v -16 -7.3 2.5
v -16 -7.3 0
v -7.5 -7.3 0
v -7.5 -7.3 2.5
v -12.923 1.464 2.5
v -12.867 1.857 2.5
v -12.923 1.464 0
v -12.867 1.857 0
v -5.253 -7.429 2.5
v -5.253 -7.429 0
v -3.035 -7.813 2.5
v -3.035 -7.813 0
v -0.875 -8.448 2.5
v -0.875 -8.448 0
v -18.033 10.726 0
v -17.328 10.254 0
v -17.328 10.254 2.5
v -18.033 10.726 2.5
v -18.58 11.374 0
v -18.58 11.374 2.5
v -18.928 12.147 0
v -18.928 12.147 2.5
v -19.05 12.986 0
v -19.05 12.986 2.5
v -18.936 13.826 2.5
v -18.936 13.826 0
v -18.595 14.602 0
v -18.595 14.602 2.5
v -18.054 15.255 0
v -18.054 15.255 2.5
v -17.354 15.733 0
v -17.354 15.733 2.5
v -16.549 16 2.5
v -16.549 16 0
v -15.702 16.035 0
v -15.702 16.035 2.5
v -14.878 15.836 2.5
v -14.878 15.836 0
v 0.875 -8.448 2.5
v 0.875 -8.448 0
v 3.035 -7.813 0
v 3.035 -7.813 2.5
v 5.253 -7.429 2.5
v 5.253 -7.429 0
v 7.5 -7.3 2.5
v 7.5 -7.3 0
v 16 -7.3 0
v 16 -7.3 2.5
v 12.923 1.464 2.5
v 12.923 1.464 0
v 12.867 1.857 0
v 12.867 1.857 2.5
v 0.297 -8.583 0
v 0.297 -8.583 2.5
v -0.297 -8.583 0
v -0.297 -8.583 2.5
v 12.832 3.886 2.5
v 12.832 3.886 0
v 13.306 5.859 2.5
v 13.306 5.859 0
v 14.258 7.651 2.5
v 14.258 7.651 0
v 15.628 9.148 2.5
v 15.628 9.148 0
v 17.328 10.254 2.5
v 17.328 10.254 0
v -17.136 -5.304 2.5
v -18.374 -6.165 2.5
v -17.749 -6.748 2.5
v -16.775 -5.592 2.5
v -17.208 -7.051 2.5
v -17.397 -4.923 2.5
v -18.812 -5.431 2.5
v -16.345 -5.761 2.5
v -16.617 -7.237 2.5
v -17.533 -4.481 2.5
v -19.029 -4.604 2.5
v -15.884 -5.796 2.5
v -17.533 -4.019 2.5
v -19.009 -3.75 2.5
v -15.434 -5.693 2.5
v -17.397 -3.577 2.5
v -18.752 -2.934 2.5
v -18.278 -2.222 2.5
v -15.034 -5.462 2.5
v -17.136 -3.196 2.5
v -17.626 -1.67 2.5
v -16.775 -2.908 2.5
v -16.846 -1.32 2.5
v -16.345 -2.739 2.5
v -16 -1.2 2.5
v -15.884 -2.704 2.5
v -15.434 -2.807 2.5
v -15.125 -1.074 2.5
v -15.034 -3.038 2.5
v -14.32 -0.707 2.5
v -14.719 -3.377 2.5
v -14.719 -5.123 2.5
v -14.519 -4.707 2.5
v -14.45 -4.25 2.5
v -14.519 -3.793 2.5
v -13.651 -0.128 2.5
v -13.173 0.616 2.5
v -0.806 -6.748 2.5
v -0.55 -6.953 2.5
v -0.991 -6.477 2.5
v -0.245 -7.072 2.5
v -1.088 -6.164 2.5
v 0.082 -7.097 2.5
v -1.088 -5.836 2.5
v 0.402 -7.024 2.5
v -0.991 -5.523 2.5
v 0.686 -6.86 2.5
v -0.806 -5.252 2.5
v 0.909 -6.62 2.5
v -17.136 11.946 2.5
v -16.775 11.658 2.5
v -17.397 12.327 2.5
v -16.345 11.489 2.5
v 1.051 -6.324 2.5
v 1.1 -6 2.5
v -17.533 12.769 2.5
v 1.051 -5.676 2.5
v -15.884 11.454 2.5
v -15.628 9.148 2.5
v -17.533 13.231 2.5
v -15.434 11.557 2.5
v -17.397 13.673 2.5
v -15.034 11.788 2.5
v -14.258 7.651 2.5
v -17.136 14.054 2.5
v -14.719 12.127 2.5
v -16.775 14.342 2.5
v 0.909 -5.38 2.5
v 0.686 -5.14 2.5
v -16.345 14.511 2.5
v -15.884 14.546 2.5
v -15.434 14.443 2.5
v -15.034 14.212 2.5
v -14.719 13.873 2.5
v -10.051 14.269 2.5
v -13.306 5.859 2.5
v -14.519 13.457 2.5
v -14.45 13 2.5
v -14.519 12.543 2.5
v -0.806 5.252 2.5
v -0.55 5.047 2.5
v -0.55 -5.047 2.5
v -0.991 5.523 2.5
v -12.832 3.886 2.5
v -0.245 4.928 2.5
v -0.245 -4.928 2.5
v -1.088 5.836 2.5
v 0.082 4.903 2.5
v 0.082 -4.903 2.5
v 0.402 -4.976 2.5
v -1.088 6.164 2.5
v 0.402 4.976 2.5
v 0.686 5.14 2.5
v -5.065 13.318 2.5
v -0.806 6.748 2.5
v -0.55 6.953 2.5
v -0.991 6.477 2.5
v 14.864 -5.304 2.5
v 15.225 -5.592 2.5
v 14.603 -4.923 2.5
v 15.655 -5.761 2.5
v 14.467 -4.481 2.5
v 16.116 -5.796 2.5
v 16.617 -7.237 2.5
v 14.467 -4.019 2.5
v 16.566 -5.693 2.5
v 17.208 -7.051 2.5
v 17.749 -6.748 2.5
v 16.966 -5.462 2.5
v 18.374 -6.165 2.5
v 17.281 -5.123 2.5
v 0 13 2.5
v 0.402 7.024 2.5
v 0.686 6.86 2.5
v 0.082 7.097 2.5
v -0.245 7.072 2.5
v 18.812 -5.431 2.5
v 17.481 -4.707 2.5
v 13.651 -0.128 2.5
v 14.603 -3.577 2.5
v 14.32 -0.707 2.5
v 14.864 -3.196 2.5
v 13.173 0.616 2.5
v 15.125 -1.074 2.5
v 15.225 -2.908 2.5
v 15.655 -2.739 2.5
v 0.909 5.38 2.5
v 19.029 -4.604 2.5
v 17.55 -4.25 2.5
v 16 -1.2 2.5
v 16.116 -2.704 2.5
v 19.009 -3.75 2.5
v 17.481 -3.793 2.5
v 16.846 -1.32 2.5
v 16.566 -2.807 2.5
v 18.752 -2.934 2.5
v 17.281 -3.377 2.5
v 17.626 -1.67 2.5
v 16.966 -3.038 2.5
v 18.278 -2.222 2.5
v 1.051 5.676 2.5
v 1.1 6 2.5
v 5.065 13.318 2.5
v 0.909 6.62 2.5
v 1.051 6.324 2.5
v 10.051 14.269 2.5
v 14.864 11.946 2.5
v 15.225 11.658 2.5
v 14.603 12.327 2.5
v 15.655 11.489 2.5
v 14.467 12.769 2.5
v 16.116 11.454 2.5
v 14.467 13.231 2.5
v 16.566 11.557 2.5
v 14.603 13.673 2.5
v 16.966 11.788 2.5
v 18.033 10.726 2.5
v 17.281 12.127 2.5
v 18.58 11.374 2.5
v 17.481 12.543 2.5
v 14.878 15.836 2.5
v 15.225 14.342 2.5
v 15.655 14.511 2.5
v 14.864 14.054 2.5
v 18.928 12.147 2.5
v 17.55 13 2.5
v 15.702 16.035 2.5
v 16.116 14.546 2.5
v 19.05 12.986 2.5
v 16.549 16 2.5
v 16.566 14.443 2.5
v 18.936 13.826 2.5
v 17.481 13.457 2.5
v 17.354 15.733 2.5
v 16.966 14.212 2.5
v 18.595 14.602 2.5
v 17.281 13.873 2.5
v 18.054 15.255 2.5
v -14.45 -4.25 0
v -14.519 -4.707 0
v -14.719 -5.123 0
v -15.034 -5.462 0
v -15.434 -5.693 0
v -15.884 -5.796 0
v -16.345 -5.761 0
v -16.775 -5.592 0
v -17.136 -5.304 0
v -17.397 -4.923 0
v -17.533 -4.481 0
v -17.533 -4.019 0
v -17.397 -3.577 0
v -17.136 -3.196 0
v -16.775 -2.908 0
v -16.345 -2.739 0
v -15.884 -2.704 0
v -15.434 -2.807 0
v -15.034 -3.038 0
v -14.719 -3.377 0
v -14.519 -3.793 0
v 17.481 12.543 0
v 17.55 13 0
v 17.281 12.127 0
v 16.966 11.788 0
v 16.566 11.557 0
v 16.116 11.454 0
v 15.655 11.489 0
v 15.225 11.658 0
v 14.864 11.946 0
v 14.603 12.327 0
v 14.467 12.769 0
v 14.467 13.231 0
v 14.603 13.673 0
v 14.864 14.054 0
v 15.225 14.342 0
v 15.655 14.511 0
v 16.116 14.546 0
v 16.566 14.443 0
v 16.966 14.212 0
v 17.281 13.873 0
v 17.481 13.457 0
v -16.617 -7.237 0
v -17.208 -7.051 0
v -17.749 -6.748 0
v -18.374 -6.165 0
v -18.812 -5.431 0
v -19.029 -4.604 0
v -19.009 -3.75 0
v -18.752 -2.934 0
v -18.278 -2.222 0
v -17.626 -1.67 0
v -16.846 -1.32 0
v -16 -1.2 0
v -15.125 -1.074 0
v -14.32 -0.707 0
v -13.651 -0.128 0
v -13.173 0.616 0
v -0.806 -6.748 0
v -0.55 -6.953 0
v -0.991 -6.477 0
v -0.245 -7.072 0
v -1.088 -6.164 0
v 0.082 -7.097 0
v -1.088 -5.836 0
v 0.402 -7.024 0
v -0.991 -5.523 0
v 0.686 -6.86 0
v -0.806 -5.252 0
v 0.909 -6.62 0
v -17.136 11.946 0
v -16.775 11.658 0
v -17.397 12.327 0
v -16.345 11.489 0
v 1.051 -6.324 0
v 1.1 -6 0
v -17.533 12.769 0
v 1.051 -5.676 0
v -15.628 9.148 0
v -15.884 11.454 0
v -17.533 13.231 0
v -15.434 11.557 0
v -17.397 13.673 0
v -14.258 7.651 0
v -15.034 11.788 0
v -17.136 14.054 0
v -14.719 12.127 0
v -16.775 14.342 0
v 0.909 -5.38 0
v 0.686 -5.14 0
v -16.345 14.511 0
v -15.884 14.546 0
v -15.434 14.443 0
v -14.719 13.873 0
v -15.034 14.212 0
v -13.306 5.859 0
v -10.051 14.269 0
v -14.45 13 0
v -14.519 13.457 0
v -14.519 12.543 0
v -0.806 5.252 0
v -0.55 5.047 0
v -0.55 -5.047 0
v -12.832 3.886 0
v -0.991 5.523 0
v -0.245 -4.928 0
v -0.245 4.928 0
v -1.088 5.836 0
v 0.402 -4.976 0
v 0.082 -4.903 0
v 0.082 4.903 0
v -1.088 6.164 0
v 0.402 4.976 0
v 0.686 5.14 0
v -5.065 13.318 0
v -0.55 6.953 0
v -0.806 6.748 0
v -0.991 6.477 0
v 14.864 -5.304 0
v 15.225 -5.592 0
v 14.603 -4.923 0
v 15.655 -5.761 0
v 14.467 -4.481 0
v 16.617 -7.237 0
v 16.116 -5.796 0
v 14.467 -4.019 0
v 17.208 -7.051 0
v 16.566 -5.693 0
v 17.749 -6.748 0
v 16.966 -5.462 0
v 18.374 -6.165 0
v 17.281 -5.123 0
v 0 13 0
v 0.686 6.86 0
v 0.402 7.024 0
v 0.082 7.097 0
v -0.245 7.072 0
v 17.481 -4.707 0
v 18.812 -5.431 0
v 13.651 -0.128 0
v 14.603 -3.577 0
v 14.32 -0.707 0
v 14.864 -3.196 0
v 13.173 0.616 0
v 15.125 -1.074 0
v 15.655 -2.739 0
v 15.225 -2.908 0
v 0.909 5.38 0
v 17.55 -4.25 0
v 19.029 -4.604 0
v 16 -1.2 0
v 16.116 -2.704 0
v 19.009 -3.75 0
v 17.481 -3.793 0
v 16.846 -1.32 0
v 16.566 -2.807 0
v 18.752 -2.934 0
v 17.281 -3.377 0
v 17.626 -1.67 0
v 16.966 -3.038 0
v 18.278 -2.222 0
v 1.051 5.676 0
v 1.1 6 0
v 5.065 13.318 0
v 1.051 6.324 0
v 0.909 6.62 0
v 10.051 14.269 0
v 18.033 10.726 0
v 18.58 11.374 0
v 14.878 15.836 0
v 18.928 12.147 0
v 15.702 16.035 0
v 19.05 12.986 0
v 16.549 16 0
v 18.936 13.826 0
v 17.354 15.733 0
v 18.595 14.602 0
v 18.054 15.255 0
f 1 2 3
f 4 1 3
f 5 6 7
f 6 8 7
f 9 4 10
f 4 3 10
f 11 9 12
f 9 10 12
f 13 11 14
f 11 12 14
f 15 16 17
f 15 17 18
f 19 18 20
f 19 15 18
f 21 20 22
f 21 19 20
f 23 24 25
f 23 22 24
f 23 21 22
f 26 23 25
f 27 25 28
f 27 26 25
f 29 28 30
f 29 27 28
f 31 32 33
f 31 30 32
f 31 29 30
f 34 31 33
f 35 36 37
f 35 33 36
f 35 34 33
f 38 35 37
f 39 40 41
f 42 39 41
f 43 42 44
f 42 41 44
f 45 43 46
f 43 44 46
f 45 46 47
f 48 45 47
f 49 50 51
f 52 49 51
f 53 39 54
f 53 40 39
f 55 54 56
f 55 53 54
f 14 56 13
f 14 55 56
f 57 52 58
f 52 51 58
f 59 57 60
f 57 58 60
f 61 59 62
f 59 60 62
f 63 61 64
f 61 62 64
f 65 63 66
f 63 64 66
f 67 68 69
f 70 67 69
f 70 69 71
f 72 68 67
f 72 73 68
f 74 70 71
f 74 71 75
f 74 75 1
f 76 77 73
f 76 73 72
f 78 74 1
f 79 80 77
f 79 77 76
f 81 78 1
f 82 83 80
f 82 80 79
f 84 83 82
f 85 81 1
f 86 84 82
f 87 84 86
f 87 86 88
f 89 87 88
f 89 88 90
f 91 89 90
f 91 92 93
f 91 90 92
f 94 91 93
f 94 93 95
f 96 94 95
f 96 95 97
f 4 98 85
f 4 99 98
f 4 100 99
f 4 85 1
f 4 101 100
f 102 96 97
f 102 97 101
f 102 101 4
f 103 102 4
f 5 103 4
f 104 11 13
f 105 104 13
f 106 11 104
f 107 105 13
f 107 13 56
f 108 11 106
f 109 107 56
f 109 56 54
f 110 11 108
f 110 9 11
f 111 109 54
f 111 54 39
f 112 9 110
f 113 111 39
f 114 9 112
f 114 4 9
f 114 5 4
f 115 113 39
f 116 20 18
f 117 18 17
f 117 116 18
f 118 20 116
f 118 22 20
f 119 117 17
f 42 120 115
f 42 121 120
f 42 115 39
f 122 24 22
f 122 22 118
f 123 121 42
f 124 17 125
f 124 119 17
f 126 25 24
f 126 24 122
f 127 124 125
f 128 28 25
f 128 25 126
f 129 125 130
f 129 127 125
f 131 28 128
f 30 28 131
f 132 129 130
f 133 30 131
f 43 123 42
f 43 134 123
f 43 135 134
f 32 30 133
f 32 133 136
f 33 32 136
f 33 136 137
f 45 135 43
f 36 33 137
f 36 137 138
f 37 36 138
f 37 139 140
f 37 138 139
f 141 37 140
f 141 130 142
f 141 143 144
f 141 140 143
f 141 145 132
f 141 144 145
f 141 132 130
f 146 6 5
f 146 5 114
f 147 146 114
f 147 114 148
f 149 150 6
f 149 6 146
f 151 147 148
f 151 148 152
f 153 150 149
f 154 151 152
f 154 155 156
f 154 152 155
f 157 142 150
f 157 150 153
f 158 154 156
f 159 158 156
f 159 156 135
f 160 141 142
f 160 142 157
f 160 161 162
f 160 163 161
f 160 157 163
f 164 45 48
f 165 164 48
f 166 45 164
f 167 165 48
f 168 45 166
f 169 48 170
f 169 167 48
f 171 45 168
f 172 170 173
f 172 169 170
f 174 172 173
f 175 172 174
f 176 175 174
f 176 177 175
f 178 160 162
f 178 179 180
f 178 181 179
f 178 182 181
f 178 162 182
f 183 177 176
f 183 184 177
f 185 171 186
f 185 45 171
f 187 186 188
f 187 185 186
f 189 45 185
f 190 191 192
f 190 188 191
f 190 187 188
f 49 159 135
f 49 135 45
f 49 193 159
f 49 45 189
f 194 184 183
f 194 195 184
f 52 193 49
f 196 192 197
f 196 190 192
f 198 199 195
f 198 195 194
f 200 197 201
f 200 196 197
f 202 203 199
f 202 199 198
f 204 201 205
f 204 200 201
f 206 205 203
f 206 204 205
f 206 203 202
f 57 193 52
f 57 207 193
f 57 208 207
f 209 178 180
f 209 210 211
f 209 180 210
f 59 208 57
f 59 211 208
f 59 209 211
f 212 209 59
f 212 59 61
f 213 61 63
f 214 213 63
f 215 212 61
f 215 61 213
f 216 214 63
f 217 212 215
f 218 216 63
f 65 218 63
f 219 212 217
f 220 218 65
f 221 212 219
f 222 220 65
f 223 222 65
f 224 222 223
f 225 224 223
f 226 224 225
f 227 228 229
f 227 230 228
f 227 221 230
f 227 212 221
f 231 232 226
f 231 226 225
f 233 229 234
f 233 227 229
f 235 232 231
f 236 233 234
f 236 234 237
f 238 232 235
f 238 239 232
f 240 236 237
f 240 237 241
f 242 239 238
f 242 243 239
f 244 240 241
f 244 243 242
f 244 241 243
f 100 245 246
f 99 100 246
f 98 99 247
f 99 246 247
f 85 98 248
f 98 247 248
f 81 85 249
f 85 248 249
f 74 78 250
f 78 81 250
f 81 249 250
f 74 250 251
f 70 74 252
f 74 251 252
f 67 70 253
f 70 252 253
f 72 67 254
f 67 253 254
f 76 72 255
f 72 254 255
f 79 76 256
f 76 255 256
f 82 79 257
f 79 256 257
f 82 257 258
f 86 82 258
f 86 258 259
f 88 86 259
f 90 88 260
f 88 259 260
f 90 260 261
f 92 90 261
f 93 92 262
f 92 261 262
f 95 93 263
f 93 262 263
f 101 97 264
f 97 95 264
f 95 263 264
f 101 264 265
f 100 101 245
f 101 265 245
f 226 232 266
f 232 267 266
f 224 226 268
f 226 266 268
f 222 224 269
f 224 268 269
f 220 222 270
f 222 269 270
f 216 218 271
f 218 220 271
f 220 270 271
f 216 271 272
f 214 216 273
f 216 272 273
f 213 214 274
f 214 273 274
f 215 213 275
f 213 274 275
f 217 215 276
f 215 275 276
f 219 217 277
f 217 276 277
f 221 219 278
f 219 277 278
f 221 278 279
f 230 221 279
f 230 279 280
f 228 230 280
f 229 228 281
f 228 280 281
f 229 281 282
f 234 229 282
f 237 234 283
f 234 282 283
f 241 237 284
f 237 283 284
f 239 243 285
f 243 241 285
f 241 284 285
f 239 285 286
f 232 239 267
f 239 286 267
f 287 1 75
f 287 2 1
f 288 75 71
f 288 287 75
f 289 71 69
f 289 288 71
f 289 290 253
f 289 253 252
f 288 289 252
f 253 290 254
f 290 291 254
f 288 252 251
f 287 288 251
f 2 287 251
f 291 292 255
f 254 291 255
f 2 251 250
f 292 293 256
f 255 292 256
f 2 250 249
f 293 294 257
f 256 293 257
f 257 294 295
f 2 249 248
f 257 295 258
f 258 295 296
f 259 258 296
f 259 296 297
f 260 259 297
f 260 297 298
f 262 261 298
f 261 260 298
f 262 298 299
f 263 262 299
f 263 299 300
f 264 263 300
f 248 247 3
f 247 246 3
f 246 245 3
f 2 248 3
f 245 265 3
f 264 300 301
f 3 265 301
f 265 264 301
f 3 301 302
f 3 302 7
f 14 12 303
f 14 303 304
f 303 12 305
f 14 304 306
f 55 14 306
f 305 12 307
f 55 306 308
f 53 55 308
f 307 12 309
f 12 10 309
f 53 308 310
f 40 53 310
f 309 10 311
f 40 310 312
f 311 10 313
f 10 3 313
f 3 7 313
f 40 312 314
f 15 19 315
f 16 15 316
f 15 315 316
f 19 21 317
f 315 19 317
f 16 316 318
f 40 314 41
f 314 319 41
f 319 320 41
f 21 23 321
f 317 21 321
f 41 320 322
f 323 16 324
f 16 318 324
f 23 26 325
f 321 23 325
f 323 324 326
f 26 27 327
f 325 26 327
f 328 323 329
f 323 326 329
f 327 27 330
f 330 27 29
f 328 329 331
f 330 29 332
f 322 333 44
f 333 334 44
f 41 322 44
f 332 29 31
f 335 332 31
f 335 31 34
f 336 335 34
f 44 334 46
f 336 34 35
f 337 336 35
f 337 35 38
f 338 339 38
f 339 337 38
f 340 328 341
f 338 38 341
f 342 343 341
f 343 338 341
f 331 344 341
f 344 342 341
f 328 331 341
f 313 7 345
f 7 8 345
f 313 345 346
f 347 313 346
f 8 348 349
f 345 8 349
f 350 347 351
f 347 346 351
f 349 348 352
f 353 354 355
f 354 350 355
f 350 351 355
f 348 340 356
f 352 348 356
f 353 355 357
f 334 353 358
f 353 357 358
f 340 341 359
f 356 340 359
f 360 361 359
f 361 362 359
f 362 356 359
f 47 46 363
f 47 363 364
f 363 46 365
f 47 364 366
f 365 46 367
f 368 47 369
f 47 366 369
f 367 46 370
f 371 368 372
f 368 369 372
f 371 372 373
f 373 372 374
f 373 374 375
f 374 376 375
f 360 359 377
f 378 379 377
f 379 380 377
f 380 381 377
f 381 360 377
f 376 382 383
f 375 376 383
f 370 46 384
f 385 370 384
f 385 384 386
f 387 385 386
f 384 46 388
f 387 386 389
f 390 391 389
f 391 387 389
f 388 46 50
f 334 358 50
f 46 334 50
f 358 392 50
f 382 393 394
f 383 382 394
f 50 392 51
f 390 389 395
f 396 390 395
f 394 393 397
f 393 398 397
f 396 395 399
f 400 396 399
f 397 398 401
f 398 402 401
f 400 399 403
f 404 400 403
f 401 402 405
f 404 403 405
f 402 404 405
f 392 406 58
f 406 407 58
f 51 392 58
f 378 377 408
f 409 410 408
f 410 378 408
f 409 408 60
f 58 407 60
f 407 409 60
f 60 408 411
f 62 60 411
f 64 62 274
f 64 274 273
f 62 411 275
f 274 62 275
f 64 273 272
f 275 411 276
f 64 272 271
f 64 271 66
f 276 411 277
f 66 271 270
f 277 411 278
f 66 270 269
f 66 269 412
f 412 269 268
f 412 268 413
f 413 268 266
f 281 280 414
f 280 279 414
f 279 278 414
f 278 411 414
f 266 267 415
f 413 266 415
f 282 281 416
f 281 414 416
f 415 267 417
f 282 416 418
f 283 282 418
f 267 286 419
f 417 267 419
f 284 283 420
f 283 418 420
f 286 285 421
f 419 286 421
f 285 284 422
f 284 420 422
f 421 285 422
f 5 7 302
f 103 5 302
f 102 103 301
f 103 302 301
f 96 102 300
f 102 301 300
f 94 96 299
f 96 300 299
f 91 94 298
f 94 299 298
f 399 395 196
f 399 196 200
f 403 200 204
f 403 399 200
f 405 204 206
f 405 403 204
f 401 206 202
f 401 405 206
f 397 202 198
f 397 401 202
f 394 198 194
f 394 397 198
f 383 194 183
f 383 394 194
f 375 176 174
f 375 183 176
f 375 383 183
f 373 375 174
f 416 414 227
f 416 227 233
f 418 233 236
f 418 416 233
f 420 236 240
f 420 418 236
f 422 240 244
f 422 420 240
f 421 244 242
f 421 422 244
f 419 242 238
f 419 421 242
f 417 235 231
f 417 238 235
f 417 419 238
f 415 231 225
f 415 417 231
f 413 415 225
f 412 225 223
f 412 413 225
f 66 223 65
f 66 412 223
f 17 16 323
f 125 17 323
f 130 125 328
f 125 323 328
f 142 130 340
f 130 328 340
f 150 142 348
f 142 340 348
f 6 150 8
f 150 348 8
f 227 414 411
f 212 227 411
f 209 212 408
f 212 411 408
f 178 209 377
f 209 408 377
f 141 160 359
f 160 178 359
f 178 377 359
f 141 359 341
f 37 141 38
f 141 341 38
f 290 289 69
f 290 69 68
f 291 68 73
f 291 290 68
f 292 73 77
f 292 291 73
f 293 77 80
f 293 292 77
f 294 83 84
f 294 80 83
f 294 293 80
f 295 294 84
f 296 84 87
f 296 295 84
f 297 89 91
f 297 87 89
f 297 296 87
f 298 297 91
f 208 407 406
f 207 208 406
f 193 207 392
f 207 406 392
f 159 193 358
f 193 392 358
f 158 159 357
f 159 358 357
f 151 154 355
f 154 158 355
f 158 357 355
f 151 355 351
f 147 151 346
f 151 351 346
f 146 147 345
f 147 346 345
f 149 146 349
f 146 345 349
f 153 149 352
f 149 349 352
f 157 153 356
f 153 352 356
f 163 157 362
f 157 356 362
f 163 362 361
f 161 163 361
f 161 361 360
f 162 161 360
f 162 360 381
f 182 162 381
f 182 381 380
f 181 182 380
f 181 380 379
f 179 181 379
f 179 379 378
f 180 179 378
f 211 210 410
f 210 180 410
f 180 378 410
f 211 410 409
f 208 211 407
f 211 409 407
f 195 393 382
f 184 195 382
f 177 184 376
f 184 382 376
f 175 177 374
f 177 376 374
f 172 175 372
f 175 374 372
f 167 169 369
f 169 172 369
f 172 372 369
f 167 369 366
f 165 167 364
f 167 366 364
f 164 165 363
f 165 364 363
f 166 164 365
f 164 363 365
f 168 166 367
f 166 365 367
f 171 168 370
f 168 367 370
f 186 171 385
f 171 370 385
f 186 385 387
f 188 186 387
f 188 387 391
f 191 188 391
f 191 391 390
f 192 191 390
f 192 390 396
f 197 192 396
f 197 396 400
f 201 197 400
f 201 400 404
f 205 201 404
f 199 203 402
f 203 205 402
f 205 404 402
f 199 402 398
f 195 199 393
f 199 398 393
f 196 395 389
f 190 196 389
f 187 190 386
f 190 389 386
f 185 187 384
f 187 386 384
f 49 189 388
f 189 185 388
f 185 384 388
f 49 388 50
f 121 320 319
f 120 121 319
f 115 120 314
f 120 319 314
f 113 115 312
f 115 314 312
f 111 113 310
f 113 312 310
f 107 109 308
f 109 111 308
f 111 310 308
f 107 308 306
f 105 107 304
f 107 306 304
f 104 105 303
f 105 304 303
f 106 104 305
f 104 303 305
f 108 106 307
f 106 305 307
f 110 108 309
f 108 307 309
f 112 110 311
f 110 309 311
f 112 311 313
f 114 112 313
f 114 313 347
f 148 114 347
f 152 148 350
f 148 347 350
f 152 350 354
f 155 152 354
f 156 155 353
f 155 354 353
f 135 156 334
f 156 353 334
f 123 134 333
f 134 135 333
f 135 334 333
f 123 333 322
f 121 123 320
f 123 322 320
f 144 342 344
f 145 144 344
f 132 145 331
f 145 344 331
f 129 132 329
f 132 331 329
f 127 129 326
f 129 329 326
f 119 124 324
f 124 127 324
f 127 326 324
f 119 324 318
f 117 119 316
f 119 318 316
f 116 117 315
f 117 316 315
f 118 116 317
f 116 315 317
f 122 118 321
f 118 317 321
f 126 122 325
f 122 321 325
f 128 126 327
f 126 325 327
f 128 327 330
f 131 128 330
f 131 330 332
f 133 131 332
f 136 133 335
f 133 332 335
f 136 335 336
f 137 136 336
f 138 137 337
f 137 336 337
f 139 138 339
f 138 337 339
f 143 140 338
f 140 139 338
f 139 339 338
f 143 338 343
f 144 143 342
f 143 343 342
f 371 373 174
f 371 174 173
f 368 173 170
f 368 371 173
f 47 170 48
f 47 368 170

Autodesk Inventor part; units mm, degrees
ref_plane "YZ Plane" through (0, 0, 0) normal (1, 0, 0) x (0, 1, 0)
ref_plane "XZ Plane" through (0, 0, 0) normal (0, 1, 0) x (-1, 0, 0)
ref_plane "XY Plane" through (0, 0, 0) normal (0, 0, 1) x (1, 0, 0)
sketch "Sketch1" plane through (0, 0, 0) normal (0, 0, 1) x (1, 0, 0)
  circle A0 centre (0, -6) radius 1.1 projected
  circle A1 centre (0, 6) radius 1.1 projected
  circle A2 centre (-16, 13) radius 1.55 projected
  circle A3 centre (16, 13) radius 1.55 projected
  circle A4 centre (-16, -4.25) radius 1.55 projected
  circle A5 centre (16, -4.25) radius 1.55 projected
  arc A6 (17.7494, -6.7484) -> (16, -1.2) centre (16, -4.25) ccw projected
  arc A7 (12.9233, 1.4645) -> (16, -1.2) centre (16, 1.9085) ccw projected
  arc A8 (17.3284, 10.2545) -> (12.8667, 1.8571) centre (20.8351, 3.0073) ccw projected
  line L0 (12.9233, 1.4645) -> (12.8667, 1.8571) projected
  arc A9 (17.3284, 10.2545) -> (14.878, 15.8361) centre (16, 13) ccw projected
  arc A10 (-14.878, 15.8361) -> (14.878, 15.8361) centre (0, 53.4422) ccw projected
  arc A11 (-14.878, 15.8361) -> (-17.3284, 10.2545) centre (-16, 13) ccw projected
  arc A12 (-12.8667, 1.8571) -> (-17.3284, 10.2545) centre (-20.8351, 3.0073) ccw projected
  arc A13 (-16, -1.2) -> (-12.9233, 1.4645) centre (-16, 1.9085) ccw projected
  line L1 (-12.8667, 1.8571) -> (-12.9233, 1.4645) projected
  arc A14 (-16, -1.2) -> (-17.7494, -6.7484) centre (-16, -4.25) ccw projected
  line L2 (0, -6) -> (-7.5, -6) construction
  line L3 (-7.5, -6) -> (-7.5, 6) construction
  line L4 (-7.5, 6) -> (0, 6) construction
  line L5 (0, 6) -> (7.5, 6) construction
  line L6 (7.5, 6) -> (7.5, -6) construction
  line L7 (7.5, -6) -> (0, -6) construction
  arc A15 (-17.7494, -6.7484) -> (-16, -7.3) centre (-16, -4.25) ccw
  arc A16 (16, -1.2) -> (16, -7.3) centre (16, -4.25) ccw construction
  line L8 (-16, -7.3) -> (-7.5, -7.3)
  arc A17 (-0.875, -8.4483) -> (0.875, -8.4483) centre (0, -6) ccw
  arc A18 (7.5, -7.3) -> (0.875, -8.4483) centre (7.5, -26.9846) ccw
  arc A19 (-0.875, -8.4483) -> (-7.5, -7.3) centre (-7.5, -26.9846) ccw
  line L9 (-7.5, -7.3) -> (-2.2517, -7.3) construction
  line L10 (7.5, -7.3) -> (16, -7.3)
  arc A20 (-2.2517, -7.3) -> (-0.875, -8.4483) centre (0, -6) ccw construction
  arc A21 (0.875, -8.4483) -> (2.2517, -7.3) centre (0, -6) ccw construction
  arc A22 (2.2517, -7.3) -> (-2.2517, -7.3) centre (0, -6) ccw construction
  line L11 (-2.2517, -7.3) -> (2.2517, -7.3) construction
  line L12 (2.2517, -7.3) -> (7.5, -7.3) construction
  arc A23 (16, -7.3) -> (17.7494, -6.7484) centre (16, -4.25) ccw
  arc A24 (-16, -7.3) -> (-16, -1.2) centre (-16, -4.25) ccw construction
  point P0 (0, 0)
  dimension "d0" = 1.5
  dimension "d1" = 15
extrude "Extrusion1" add sketch "Sketch1" along normal blind 2.5
properties part number "AS5600_mount"
